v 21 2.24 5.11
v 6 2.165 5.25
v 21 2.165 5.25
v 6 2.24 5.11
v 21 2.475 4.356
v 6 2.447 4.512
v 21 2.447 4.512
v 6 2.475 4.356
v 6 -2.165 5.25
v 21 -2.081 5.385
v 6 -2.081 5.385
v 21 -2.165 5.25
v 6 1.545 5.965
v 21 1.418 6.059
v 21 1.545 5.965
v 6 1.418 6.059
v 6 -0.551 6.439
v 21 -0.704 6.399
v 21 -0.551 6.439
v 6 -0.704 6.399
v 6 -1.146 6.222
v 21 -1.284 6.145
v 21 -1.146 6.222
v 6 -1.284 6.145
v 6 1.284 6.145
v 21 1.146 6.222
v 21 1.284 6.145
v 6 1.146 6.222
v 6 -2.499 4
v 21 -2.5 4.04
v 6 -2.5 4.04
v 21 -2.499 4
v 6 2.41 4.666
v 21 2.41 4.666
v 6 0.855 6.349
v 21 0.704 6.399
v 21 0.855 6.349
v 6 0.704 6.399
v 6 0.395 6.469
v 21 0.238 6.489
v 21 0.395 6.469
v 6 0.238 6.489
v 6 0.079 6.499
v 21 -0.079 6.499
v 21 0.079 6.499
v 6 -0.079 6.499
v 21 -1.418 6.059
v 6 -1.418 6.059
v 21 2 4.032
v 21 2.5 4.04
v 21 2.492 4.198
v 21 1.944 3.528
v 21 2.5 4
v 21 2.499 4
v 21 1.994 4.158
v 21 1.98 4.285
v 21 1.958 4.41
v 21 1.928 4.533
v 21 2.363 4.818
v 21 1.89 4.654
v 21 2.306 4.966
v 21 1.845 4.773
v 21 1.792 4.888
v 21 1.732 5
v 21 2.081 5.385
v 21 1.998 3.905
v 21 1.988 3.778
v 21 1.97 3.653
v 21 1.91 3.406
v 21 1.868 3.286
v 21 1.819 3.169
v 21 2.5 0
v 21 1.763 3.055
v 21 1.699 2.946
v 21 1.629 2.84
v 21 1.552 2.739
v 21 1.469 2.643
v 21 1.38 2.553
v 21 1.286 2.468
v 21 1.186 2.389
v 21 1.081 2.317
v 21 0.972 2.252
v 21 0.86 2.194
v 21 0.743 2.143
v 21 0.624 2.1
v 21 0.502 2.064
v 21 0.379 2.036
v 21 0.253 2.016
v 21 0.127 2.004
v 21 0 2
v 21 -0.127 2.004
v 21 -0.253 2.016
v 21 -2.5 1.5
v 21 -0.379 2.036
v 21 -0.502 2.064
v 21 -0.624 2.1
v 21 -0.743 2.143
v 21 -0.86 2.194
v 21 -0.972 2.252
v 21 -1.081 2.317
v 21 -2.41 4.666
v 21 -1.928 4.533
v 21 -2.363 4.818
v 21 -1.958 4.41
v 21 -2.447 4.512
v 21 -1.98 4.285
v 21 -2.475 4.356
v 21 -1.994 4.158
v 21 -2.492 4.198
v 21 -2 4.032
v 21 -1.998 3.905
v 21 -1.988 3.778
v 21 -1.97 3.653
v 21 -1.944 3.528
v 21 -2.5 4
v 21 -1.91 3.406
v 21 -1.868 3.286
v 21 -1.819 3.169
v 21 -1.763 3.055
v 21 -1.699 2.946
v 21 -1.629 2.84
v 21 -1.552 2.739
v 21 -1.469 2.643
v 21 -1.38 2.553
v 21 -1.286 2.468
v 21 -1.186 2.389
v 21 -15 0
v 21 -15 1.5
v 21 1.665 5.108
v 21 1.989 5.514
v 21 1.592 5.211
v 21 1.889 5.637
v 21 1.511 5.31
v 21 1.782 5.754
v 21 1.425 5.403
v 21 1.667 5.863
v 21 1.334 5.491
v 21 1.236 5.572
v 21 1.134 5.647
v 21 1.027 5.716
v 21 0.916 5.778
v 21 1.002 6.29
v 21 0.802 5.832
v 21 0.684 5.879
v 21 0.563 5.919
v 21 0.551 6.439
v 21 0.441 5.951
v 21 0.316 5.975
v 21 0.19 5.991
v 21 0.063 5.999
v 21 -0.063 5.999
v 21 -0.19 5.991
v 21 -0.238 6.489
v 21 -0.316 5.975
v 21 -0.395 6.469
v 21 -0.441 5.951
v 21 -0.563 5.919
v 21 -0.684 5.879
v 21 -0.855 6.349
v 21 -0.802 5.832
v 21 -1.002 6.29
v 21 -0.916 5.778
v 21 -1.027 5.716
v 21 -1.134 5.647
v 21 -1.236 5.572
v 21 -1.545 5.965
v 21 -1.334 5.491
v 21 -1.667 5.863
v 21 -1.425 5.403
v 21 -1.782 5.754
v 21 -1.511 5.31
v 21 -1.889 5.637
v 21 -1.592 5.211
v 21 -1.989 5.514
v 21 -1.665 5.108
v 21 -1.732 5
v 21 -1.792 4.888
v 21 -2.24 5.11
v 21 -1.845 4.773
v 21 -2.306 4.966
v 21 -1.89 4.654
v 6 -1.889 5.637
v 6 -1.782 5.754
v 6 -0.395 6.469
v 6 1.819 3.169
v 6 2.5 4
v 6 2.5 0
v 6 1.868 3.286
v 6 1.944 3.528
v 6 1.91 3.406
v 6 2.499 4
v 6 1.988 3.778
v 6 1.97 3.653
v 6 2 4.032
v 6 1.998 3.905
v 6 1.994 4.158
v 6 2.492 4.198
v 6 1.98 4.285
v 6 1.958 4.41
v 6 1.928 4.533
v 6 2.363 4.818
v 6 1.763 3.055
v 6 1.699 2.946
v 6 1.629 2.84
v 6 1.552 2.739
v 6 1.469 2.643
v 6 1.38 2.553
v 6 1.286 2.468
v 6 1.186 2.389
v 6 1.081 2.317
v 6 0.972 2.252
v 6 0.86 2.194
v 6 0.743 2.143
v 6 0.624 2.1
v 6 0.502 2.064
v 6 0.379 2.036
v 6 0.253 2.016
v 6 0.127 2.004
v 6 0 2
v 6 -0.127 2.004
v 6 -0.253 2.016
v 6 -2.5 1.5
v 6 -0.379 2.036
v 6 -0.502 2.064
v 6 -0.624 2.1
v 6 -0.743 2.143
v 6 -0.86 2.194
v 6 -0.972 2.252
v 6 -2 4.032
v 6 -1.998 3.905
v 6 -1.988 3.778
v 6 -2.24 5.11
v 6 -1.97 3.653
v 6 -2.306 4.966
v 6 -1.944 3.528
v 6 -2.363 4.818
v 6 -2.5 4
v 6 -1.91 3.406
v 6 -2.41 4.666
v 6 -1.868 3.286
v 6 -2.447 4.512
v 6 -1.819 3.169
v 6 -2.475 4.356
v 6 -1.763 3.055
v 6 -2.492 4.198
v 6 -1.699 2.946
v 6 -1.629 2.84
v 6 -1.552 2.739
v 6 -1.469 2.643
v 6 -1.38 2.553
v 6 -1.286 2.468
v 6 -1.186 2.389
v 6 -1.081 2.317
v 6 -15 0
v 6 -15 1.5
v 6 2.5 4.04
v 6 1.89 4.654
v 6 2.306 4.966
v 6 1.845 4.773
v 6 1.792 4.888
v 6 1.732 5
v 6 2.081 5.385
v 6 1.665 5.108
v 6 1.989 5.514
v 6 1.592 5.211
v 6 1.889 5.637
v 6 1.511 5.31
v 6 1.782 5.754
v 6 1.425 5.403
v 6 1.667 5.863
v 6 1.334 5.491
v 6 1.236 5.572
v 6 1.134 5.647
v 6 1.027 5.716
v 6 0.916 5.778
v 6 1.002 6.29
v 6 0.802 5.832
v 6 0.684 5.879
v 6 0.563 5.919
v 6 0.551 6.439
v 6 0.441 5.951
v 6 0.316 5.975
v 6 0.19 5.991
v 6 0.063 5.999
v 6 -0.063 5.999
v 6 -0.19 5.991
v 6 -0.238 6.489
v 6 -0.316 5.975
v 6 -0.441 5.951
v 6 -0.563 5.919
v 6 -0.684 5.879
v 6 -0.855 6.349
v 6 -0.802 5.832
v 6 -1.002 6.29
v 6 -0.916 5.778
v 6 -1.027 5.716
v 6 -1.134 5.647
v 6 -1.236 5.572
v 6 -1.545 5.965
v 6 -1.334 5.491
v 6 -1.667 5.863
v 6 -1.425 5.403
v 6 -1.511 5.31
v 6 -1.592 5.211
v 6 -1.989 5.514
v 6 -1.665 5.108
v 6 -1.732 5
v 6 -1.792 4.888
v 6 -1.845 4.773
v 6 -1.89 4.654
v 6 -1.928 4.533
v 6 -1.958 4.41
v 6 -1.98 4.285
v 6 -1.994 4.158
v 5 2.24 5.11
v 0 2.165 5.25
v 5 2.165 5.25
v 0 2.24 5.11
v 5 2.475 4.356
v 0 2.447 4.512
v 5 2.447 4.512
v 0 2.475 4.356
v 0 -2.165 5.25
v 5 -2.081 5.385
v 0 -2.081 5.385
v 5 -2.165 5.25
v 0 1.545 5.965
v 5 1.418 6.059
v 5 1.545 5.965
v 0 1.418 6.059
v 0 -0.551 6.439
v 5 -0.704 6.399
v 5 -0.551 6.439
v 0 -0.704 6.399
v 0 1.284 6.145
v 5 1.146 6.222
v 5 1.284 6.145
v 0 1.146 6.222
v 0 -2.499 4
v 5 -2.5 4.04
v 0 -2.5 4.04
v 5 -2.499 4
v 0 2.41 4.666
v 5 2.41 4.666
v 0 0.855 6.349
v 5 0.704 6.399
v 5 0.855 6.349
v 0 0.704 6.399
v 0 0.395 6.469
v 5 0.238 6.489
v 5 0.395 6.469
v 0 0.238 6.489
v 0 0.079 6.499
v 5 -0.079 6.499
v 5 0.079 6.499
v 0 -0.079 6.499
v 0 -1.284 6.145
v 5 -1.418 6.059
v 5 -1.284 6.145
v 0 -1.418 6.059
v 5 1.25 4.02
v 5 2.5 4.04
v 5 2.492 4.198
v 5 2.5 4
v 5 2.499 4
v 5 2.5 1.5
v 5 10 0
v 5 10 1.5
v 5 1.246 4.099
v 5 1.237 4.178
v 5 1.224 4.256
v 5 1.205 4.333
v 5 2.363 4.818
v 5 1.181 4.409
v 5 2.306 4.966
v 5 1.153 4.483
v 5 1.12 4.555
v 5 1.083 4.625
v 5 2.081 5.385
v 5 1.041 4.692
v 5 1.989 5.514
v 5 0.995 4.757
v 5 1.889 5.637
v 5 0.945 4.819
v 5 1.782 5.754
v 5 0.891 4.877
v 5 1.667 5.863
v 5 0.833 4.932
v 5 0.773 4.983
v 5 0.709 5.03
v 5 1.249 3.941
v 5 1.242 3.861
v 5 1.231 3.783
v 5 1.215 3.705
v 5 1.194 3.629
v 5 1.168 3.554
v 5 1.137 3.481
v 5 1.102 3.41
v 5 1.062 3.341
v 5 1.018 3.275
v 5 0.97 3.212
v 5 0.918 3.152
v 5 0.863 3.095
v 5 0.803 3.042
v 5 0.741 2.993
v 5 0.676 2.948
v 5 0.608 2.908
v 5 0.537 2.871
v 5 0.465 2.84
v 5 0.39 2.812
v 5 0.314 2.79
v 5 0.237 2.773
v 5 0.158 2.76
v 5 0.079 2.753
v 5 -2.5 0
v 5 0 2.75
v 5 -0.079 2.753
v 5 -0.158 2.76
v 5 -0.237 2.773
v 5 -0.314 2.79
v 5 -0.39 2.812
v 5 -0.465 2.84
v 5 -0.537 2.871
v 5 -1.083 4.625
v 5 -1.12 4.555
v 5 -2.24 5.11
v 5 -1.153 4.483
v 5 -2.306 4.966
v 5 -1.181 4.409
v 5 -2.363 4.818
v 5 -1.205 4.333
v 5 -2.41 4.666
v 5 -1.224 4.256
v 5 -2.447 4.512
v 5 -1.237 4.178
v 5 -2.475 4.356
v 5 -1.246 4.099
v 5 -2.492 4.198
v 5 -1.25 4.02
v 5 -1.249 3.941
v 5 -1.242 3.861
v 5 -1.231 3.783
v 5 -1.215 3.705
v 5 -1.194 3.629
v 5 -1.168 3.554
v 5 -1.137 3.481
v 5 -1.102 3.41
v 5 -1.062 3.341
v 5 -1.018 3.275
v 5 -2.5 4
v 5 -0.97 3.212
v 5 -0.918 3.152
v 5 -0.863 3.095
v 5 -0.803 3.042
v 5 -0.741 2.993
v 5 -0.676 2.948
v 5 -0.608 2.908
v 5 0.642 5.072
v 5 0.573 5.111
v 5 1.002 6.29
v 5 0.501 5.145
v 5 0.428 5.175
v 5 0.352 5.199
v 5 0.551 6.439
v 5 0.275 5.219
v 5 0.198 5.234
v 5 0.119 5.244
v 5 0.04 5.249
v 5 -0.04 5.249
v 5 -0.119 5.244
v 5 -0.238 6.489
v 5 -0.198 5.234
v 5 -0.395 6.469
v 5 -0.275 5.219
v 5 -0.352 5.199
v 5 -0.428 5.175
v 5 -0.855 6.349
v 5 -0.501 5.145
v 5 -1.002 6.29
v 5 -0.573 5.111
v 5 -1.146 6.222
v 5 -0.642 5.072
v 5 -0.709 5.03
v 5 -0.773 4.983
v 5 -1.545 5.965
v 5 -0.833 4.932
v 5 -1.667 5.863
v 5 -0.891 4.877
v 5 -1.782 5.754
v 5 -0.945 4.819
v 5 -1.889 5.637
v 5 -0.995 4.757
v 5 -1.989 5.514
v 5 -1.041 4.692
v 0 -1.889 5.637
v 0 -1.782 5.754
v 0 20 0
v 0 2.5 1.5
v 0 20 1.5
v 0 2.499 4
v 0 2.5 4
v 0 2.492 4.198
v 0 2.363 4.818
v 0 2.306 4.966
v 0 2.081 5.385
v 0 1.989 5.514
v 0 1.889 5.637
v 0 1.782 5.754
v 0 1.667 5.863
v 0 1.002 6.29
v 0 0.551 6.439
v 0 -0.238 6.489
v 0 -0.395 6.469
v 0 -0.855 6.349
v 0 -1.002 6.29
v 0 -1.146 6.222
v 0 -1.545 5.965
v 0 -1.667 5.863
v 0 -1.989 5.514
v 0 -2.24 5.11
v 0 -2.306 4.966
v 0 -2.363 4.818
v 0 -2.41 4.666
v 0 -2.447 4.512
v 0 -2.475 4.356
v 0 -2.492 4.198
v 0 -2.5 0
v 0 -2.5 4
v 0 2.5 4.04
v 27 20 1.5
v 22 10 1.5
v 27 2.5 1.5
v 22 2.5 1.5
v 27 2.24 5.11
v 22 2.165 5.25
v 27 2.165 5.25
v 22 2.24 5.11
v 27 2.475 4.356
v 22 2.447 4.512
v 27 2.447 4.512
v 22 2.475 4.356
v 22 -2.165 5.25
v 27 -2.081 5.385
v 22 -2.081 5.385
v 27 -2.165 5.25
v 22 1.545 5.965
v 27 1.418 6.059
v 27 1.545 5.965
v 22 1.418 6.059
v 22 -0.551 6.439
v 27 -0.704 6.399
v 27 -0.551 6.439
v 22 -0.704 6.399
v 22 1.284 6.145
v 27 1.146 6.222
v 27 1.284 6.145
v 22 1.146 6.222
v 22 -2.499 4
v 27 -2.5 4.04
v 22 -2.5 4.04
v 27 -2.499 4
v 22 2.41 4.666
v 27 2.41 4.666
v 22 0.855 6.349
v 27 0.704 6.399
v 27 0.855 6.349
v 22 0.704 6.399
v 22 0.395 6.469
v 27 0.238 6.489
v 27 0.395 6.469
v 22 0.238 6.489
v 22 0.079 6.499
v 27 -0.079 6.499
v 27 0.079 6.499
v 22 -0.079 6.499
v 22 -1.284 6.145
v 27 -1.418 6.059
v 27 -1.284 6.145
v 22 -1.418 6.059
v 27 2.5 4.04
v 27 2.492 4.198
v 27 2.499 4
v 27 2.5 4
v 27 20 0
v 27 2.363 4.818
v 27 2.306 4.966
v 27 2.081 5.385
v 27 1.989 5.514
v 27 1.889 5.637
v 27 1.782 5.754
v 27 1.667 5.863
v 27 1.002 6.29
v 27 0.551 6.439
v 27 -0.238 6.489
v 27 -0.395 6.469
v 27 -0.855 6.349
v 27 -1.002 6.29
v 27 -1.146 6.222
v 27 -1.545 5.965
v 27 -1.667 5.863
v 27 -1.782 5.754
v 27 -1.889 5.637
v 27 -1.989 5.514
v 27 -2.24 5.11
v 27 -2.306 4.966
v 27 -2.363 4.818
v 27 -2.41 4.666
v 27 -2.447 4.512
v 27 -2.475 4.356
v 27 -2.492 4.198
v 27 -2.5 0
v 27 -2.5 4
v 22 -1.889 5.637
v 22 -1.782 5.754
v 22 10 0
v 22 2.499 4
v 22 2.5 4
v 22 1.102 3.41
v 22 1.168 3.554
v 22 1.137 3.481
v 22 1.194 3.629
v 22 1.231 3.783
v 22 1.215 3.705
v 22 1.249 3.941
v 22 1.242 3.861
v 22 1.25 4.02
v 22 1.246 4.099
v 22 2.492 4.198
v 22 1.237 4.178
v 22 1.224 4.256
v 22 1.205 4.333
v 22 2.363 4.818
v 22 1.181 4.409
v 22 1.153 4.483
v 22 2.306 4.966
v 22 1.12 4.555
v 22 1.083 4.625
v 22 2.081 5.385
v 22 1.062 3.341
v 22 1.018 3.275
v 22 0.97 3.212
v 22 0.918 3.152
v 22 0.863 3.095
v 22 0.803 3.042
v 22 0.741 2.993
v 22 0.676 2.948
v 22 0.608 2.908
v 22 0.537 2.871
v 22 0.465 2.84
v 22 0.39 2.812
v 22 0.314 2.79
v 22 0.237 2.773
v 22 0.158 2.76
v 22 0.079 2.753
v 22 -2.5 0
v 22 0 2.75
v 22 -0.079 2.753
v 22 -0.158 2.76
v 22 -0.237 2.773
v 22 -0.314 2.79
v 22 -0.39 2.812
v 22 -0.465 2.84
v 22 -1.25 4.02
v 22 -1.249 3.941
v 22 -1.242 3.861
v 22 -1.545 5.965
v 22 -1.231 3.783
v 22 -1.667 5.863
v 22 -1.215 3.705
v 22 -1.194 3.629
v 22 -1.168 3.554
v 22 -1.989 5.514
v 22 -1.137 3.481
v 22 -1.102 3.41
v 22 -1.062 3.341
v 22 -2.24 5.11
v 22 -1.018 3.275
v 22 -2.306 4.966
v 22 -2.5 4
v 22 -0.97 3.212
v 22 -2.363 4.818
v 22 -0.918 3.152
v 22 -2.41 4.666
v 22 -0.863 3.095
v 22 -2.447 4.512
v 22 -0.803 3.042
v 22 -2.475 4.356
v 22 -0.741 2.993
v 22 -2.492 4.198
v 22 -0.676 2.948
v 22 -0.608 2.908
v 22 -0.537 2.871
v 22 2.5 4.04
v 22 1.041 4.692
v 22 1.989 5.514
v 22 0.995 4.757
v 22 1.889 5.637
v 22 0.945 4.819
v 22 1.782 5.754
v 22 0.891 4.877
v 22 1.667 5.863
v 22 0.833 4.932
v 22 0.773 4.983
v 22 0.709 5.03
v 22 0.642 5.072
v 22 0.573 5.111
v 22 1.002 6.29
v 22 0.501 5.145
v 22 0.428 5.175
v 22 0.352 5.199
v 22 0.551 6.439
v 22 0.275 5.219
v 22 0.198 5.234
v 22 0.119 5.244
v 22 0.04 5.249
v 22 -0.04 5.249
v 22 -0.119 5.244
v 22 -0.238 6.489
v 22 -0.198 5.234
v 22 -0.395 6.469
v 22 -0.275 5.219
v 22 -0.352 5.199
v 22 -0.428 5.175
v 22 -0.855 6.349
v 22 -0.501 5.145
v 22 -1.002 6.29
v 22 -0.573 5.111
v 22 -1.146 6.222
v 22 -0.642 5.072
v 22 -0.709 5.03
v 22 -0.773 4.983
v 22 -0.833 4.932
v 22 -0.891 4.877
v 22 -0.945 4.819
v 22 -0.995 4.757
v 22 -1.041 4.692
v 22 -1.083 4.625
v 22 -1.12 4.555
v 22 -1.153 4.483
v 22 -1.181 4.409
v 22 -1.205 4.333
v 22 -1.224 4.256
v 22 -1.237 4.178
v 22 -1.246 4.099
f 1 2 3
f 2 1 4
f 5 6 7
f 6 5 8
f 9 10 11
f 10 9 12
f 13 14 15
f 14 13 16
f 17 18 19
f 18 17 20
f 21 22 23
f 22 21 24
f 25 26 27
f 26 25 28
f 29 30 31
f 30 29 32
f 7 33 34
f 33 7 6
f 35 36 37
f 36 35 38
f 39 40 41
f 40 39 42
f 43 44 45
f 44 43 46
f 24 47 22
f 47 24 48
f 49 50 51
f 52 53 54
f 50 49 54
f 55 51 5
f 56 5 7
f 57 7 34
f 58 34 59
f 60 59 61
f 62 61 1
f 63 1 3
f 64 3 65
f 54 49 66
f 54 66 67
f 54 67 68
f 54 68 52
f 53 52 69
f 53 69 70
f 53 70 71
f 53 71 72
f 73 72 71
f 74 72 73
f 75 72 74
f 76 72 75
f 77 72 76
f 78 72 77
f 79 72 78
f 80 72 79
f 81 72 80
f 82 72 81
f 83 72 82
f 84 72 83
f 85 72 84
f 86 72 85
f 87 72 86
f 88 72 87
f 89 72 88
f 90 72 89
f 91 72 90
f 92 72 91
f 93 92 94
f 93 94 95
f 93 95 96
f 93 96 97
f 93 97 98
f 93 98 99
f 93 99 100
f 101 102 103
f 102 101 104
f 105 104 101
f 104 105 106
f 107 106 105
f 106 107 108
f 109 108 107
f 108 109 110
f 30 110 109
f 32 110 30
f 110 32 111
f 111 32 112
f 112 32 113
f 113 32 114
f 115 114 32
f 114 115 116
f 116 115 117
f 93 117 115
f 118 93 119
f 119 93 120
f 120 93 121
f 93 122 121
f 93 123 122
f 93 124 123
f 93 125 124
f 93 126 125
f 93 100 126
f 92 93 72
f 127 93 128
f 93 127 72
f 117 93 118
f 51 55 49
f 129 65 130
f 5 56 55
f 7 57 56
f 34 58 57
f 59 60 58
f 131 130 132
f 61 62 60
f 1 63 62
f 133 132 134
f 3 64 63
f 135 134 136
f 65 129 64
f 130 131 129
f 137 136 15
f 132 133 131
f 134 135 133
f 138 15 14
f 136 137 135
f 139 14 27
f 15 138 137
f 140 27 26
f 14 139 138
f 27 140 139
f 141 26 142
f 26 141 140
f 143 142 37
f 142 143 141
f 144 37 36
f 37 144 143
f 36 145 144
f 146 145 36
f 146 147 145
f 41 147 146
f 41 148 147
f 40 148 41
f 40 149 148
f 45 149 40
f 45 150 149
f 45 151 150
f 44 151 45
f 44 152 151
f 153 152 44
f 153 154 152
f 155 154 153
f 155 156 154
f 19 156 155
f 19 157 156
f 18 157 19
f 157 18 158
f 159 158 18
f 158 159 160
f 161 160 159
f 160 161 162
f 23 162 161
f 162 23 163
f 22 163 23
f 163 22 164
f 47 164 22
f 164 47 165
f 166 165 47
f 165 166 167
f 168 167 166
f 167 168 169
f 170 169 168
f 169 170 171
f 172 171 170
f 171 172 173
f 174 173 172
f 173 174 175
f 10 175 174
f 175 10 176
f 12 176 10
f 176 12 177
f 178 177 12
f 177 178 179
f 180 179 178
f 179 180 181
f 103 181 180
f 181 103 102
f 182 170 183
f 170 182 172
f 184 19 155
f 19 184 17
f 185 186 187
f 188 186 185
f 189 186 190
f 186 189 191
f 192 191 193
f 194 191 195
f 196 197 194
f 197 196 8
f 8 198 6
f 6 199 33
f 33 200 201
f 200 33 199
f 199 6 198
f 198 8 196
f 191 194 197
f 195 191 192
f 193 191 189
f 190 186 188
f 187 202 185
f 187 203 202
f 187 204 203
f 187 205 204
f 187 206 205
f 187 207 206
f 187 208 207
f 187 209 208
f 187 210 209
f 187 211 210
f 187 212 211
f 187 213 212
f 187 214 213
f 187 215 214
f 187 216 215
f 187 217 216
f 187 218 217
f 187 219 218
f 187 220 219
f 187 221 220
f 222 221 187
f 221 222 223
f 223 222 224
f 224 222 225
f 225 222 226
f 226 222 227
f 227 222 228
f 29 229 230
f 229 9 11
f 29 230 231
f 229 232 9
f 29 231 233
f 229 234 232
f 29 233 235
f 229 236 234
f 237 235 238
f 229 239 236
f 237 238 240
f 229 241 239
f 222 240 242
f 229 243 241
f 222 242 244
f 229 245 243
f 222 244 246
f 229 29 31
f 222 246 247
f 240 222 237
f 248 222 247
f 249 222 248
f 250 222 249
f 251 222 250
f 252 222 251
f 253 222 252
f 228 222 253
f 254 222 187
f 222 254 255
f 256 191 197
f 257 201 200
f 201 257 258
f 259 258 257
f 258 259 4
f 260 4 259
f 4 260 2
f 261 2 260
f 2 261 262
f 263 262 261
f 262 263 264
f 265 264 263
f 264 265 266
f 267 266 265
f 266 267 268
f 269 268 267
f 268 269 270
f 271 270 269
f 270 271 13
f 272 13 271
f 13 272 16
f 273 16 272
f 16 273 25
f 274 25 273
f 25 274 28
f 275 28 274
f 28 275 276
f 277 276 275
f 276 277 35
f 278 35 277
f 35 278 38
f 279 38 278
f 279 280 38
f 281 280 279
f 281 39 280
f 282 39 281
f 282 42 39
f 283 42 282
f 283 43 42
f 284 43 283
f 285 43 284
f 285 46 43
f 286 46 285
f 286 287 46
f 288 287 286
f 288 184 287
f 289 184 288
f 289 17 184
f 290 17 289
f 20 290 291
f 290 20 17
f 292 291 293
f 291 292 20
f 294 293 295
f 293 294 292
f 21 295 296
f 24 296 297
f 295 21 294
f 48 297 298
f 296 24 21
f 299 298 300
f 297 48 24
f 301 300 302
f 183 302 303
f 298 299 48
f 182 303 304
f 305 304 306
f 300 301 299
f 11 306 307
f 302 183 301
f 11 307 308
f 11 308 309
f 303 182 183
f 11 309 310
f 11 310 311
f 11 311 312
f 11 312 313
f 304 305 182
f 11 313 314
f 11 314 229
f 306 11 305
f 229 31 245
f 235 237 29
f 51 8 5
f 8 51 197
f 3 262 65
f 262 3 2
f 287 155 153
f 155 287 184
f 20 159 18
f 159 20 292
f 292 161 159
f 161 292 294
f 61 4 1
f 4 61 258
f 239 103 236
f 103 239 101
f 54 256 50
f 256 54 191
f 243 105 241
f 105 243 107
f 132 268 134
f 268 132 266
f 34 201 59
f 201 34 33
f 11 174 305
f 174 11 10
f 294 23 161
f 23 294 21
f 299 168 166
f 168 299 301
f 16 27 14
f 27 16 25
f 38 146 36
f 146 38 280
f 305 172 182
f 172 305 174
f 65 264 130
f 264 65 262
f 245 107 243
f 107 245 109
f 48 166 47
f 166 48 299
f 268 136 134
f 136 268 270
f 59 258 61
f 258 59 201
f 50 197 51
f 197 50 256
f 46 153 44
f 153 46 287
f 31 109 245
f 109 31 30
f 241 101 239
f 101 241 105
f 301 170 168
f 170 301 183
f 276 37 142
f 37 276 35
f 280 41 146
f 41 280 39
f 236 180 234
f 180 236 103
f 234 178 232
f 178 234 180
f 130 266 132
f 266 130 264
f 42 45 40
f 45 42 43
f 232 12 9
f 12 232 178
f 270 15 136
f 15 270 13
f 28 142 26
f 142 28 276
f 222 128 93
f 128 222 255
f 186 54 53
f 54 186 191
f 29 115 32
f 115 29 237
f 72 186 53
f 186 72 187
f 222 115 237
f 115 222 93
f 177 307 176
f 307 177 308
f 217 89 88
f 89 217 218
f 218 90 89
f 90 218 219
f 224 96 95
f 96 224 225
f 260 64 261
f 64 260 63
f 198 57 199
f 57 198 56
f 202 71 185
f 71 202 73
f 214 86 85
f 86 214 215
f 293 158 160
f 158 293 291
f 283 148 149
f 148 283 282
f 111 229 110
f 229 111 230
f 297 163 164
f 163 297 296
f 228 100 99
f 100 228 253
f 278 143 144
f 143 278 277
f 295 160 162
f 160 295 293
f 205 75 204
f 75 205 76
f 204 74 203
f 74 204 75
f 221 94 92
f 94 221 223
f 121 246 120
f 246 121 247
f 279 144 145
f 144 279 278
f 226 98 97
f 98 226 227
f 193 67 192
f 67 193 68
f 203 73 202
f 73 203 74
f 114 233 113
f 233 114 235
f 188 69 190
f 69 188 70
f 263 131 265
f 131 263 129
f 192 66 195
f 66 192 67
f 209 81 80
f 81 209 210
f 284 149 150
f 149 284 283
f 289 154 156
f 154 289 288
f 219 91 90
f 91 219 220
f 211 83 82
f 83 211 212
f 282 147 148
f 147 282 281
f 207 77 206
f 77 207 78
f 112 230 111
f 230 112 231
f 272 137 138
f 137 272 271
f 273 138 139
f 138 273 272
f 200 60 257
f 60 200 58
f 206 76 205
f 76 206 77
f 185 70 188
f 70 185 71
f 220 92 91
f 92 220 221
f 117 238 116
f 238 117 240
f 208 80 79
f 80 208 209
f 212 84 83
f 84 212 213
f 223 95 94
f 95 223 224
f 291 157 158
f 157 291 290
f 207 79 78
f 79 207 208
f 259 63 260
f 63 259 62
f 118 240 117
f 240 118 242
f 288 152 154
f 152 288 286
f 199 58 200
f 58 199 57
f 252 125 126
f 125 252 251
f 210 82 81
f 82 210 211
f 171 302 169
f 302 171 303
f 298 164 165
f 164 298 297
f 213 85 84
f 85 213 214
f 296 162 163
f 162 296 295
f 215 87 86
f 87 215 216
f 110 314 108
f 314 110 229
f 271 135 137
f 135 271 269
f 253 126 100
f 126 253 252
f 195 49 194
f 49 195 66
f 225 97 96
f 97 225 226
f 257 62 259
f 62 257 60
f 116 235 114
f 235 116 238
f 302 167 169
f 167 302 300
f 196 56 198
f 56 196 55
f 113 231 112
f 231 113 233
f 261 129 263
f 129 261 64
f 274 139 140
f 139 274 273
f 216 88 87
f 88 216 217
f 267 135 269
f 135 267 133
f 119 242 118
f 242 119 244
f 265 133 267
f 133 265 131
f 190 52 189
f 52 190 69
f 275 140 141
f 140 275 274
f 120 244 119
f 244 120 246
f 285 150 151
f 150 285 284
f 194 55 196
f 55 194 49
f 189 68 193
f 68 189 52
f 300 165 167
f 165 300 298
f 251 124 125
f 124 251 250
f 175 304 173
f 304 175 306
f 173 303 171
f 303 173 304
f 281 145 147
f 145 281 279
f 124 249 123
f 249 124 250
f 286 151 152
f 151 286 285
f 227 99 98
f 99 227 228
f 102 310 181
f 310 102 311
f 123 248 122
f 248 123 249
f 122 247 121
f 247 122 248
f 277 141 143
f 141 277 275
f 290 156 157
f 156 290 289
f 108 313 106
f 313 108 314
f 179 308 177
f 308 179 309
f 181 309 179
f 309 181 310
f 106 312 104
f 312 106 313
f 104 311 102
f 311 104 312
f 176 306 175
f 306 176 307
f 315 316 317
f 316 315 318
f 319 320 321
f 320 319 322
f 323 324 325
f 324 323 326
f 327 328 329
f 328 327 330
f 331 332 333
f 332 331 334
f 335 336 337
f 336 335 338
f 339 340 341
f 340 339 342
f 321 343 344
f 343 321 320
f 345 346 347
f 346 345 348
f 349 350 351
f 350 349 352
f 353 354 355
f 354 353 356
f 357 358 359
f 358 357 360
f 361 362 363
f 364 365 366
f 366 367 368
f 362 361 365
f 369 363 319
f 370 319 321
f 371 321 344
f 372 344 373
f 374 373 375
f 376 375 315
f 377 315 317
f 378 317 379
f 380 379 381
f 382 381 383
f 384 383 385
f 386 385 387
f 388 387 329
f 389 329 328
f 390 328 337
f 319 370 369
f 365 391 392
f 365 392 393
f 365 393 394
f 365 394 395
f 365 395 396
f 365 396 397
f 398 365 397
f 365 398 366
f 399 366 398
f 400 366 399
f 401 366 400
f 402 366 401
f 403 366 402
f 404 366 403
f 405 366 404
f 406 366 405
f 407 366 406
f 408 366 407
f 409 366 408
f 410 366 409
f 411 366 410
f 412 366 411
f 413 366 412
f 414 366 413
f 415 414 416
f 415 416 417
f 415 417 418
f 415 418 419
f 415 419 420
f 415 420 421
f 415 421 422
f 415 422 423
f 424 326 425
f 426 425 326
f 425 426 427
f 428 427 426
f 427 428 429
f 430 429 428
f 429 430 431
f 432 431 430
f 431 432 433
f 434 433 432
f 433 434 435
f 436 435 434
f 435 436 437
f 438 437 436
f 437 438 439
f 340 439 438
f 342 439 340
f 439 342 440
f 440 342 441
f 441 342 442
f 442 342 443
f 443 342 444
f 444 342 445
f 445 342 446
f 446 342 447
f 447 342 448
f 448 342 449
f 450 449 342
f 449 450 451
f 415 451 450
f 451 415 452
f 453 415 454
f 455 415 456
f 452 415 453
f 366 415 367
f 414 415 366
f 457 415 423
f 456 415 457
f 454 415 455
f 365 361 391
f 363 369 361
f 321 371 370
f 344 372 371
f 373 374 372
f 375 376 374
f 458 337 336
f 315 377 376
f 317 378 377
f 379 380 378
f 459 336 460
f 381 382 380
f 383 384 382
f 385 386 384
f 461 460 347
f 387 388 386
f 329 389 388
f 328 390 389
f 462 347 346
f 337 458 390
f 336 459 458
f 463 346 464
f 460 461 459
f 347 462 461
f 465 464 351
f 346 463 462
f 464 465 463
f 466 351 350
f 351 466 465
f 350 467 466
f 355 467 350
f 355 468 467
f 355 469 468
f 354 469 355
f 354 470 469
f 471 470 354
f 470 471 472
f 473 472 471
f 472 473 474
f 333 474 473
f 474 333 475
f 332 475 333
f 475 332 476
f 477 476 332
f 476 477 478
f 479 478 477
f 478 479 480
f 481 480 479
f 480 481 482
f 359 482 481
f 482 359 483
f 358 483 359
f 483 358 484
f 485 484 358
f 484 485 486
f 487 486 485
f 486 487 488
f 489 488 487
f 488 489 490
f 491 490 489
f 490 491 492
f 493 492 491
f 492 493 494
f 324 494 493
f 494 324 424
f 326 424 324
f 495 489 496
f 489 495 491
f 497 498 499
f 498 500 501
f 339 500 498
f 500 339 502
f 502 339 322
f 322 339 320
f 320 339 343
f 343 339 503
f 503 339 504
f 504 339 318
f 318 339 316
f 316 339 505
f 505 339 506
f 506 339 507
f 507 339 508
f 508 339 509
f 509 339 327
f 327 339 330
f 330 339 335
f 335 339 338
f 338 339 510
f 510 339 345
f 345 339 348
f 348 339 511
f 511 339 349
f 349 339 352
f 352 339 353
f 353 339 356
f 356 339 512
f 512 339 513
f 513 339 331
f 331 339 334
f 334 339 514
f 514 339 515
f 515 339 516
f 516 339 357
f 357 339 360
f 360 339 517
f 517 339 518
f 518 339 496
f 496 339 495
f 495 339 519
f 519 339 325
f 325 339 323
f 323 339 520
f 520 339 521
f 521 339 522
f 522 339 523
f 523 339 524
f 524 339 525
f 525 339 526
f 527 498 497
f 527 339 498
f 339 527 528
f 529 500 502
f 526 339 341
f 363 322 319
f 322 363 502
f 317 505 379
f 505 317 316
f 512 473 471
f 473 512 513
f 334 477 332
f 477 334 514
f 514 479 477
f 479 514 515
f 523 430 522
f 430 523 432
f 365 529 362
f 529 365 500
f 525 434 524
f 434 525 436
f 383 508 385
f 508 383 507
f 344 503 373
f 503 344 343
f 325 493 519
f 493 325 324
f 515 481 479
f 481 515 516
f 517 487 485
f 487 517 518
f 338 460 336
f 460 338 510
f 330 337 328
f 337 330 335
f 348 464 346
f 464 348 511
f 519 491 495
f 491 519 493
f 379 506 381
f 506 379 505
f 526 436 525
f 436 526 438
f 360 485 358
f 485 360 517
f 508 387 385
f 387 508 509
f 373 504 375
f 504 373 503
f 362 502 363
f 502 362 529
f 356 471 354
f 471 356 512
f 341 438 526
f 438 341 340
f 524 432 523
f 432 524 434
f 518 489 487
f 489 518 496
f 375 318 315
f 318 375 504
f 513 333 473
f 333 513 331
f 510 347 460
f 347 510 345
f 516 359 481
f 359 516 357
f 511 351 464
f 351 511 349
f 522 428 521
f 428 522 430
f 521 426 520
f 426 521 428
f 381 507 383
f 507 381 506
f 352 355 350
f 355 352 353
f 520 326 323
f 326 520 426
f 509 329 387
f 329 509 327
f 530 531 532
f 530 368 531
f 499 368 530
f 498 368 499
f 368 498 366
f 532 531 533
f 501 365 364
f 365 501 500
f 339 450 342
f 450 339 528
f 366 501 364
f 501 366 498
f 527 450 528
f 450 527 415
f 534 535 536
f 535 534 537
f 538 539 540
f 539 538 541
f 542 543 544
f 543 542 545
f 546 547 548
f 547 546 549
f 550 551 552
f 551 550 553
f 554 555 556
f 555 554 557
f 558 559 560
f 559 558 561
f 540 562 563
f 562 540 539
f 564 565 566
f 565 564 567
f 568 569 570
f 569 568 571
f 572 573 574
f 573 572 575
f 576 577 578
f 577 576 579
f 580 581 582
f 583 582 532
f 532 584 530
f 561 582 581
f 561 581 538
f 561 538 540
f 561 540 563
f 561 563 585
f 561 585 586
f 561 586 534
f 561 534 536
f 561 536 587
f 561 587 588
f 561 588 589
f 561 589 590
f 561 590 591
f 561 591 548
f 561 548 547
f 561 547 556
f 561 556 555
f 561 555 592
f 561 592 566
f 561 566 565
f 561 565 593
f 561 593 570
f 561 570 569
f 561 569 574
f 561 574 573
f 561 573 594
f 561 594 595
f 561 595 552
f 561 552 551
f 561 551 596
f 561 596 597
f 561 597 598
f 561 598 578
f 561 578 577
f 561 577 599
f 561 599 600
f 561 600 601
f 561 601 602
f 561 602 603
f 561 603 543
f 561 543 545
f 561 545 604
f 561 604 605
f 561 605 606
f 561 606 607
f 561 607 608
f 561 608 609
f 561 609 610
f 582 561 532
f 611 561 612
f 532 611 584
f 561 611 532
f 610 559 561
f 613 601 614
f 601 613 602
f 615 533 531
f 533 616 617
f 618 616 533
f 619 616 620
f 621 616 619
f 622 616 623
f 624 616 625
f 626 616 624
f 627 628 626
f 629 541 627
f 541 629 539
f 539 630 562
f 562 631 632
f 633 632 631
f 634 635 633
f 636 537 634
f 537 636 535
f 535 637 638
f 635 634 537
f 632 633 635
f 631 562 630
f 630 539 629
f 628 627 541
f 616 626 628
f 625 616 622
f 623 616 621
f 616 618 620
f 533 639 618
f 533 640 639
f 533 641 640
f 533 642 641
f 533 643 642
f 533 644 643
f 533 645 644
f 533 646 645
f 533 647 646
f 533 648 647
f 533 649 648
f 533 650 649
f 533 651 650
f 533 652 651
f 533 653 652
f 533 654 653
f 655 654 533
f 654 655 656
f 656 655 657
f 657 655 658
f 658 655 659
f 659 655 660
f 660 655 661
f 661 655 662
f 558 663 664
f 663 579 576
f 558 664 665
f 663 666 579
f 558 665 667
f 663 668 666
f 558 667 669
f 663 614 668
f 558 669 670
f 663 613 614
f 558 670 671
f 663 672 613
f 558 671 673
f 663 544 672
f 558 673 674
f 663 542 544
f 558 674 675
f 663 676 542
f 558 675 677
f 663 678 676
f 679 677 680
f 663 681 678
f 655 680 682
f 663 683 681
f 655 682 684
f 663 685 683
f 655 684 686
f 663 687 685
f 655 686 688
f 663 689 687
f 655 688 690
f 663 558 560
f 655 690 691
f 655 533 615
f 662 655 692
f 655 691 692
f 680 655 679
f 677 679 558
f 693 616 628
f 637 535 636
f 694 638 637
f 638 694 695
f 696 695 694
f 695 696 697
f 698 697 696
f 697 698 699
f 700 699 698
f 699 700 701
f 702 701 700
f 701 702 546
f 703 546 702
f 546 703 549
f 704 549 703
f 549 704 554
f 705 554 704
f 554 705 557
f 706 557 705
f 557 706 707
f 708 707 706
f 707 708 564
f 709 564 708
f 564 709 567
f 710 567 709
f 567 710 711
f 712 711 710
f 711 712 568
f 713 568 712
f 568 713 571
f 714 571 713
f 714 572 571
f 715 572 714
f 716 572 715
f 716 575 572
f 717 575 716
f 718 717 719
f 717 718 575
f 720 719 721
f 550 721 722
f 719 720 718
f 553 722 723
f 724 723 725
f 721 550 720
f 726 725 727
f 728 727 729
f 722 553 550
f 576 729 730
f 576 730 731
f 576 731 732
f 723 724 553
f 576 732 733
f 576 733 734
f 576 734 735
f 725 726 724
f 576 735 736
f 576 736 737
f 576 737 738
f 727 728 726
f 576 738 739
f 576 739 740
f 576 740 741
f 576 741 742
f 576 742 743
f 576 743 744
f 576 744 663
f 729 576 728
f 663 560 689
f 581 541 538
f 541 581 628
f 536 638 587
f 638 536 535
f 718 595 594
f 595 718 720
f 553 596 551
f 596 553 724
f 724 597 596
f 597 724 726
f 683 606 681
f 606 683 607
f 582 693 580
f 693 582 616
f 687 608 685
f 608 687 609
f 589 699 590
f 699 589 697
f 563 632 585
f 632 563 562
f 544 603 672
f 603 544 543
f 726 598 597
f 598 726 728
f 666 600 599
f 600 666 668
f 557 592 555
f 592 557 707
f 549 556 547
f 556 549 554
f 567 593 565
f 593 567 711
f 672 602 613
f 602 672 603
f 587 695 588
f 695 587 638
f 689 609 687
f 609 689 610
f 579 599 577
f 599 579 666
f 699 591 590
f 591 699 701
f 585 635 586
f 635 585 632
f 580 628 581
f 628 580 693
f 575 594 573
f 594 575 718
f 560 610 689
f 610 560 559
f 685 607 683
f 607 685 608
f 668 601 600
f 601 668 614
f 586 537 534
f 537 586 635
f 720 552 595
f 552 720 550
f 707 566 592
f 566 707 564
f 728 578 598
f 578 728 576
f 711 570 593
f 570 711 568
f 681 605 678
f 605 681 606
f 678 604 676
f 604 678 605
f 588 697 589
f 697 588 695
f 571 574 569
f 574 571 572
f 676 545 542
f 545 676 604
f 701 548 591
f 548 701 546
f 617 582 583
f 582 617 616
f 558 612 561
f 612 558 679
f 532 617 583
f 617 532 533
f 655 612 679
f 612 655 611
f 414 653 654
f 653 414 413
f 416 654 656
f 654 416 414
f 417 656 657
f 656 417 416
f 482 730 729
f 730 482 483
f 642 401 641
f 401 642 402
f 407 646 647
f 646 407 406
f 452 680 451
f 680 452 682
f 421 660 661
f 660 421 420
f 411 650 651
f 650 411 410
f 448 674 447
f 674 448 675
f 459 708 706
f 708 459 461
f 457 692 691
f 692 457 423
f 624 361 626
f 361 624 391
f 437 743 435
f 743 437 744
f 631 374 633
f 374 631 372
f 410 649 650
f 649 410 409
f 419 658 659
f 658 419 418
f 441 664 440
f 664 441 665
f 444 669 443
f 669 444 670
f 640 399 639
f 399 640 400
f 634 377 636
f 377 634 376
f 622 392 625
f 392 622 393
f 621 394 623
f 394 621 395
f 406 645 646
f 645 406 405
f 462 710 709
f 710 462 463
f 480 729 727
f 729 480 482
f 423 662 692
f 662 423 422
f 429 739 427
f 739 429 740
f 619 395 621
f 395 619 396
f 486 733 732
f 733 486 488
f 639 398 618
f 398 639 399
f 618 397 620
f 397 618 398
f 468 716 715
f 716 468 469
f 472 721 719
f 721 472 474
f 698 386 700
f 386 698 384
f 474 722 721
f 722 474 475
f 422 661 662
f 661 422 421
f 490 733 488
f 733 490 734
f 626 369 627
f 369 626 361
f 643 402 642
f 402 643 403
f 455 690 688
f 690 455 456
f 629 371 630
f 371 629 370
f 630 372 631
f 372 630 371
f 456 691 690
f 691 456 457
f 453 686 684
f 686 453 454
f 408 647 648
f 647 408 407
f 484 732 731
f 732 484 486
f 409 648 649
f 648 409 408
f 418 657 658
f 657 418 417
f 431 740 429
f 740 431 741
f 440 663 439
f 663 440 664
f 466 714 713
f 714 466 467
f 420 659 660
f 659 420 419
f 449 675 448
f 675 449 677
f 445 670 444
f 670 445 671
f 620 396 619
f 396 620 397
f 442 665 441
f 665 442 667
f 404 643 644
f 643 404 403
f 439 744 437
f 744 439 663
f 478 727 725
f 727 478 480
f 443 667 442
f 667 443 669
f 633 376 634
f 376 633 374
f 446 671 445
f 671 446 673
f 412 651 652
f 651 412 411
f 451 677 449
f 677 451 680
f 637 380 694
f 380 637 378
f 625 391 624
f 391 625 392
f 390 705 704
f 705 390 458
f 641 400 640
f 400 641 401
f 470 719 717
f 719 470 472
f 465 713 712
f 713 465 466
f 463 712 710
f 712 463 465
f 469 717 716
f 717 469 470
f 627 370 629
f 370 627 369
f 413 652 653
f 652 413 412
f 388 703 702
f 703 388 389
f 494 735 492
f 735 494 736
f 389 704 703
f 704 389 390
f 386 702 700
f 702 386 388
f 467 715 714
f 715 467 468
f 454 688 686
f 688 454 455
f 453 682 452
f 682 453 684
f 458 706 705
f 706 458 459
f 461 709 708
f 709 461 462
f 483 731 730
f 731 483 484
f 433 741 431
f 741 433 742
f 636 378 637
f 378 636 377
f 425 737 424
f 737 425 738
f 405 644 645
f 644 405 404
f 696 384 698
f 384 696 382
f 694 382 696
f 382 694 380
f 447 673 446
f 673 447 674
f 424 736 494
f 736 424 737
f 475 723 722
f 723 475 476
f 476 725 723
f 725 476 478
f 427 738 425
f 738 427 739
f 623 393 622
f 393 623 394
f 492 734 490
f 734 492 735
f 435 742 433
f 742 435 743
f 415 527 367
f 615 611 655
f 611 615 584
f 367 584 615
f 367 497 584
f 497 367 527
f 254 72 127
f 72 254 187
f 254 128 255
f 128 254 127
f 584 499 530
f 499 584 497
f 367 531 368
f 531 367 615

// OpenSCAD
/*
 * Author: Kevin Osborn
 * License: Public Domain
 * Print in place hinge. Mostly Paremetric, though the 
 * hinge pin needs enough clearance to break free, so it may not
 * scale equally well in all dimensions (right now there is a fixed
 * .5mm clearance)I think 1.5mm is probably about the lowest radius 
 * The end caps are 1/3 body length, but could probably be fixed length.
 * 
 *
 */
 
 module hinge(radius,length,gap)
{
    module hingebody(r=radius,l=length){
            union(){
            cylinder(r=r,h=l,$fn=99);
            translate([0,-r,0])cube([r,2*r,l]);
            }
    }
    translate([length/3+gap,0,radius])rotate([0,90,0])union(){
        difference(){ //central hollow part
        hingebody(radius,length);
        translate([0,0,-1])cylinder(r=radius-.5,h=length+2,$fn=99);
        }
        //hinge pin
        translate([0,0,-5])cylinder(r=radius/2,h=length+10,$fn=99);
        translate([0,0,-length/3-gap])hingebody(radius,length/3);
        translate([0,0,length+gap])hingebody(radius,length/3);
    }
}
// let's make us a sample hinge!
Hinge_r =2.5;
Hinge_l = 15;
tab_l = 15;
gap = 1;
hinge_centerx = Hinge_l/2+Hinge_l/3+gap;
translate([0,0,1.5])hinge(Hinge_r,Hinge_l,gap);
//outer tabs
translate ([0,-Hinge_r,0])cube([Hinge_l/3,tab_l,1.5]);
translate ([Hinge_l+Hinge_l/3+2*gap,-Hinge_r,0])cube([Hinge_l/3,tab_l,1.5]);
//center tab
translate([Hinge_l/3+gap,-tab_l+Hinge_r,0])cube([Hinge_l,tab_l,1.5]);
//something to connect 
translate([Hinge_l/3+gap,-15,0])cube([Hinge_l,10,1.5]);
translate([0,10,0])cube([Hinge_l+2*(Hinge_l/3+gap),10,1.5]);
